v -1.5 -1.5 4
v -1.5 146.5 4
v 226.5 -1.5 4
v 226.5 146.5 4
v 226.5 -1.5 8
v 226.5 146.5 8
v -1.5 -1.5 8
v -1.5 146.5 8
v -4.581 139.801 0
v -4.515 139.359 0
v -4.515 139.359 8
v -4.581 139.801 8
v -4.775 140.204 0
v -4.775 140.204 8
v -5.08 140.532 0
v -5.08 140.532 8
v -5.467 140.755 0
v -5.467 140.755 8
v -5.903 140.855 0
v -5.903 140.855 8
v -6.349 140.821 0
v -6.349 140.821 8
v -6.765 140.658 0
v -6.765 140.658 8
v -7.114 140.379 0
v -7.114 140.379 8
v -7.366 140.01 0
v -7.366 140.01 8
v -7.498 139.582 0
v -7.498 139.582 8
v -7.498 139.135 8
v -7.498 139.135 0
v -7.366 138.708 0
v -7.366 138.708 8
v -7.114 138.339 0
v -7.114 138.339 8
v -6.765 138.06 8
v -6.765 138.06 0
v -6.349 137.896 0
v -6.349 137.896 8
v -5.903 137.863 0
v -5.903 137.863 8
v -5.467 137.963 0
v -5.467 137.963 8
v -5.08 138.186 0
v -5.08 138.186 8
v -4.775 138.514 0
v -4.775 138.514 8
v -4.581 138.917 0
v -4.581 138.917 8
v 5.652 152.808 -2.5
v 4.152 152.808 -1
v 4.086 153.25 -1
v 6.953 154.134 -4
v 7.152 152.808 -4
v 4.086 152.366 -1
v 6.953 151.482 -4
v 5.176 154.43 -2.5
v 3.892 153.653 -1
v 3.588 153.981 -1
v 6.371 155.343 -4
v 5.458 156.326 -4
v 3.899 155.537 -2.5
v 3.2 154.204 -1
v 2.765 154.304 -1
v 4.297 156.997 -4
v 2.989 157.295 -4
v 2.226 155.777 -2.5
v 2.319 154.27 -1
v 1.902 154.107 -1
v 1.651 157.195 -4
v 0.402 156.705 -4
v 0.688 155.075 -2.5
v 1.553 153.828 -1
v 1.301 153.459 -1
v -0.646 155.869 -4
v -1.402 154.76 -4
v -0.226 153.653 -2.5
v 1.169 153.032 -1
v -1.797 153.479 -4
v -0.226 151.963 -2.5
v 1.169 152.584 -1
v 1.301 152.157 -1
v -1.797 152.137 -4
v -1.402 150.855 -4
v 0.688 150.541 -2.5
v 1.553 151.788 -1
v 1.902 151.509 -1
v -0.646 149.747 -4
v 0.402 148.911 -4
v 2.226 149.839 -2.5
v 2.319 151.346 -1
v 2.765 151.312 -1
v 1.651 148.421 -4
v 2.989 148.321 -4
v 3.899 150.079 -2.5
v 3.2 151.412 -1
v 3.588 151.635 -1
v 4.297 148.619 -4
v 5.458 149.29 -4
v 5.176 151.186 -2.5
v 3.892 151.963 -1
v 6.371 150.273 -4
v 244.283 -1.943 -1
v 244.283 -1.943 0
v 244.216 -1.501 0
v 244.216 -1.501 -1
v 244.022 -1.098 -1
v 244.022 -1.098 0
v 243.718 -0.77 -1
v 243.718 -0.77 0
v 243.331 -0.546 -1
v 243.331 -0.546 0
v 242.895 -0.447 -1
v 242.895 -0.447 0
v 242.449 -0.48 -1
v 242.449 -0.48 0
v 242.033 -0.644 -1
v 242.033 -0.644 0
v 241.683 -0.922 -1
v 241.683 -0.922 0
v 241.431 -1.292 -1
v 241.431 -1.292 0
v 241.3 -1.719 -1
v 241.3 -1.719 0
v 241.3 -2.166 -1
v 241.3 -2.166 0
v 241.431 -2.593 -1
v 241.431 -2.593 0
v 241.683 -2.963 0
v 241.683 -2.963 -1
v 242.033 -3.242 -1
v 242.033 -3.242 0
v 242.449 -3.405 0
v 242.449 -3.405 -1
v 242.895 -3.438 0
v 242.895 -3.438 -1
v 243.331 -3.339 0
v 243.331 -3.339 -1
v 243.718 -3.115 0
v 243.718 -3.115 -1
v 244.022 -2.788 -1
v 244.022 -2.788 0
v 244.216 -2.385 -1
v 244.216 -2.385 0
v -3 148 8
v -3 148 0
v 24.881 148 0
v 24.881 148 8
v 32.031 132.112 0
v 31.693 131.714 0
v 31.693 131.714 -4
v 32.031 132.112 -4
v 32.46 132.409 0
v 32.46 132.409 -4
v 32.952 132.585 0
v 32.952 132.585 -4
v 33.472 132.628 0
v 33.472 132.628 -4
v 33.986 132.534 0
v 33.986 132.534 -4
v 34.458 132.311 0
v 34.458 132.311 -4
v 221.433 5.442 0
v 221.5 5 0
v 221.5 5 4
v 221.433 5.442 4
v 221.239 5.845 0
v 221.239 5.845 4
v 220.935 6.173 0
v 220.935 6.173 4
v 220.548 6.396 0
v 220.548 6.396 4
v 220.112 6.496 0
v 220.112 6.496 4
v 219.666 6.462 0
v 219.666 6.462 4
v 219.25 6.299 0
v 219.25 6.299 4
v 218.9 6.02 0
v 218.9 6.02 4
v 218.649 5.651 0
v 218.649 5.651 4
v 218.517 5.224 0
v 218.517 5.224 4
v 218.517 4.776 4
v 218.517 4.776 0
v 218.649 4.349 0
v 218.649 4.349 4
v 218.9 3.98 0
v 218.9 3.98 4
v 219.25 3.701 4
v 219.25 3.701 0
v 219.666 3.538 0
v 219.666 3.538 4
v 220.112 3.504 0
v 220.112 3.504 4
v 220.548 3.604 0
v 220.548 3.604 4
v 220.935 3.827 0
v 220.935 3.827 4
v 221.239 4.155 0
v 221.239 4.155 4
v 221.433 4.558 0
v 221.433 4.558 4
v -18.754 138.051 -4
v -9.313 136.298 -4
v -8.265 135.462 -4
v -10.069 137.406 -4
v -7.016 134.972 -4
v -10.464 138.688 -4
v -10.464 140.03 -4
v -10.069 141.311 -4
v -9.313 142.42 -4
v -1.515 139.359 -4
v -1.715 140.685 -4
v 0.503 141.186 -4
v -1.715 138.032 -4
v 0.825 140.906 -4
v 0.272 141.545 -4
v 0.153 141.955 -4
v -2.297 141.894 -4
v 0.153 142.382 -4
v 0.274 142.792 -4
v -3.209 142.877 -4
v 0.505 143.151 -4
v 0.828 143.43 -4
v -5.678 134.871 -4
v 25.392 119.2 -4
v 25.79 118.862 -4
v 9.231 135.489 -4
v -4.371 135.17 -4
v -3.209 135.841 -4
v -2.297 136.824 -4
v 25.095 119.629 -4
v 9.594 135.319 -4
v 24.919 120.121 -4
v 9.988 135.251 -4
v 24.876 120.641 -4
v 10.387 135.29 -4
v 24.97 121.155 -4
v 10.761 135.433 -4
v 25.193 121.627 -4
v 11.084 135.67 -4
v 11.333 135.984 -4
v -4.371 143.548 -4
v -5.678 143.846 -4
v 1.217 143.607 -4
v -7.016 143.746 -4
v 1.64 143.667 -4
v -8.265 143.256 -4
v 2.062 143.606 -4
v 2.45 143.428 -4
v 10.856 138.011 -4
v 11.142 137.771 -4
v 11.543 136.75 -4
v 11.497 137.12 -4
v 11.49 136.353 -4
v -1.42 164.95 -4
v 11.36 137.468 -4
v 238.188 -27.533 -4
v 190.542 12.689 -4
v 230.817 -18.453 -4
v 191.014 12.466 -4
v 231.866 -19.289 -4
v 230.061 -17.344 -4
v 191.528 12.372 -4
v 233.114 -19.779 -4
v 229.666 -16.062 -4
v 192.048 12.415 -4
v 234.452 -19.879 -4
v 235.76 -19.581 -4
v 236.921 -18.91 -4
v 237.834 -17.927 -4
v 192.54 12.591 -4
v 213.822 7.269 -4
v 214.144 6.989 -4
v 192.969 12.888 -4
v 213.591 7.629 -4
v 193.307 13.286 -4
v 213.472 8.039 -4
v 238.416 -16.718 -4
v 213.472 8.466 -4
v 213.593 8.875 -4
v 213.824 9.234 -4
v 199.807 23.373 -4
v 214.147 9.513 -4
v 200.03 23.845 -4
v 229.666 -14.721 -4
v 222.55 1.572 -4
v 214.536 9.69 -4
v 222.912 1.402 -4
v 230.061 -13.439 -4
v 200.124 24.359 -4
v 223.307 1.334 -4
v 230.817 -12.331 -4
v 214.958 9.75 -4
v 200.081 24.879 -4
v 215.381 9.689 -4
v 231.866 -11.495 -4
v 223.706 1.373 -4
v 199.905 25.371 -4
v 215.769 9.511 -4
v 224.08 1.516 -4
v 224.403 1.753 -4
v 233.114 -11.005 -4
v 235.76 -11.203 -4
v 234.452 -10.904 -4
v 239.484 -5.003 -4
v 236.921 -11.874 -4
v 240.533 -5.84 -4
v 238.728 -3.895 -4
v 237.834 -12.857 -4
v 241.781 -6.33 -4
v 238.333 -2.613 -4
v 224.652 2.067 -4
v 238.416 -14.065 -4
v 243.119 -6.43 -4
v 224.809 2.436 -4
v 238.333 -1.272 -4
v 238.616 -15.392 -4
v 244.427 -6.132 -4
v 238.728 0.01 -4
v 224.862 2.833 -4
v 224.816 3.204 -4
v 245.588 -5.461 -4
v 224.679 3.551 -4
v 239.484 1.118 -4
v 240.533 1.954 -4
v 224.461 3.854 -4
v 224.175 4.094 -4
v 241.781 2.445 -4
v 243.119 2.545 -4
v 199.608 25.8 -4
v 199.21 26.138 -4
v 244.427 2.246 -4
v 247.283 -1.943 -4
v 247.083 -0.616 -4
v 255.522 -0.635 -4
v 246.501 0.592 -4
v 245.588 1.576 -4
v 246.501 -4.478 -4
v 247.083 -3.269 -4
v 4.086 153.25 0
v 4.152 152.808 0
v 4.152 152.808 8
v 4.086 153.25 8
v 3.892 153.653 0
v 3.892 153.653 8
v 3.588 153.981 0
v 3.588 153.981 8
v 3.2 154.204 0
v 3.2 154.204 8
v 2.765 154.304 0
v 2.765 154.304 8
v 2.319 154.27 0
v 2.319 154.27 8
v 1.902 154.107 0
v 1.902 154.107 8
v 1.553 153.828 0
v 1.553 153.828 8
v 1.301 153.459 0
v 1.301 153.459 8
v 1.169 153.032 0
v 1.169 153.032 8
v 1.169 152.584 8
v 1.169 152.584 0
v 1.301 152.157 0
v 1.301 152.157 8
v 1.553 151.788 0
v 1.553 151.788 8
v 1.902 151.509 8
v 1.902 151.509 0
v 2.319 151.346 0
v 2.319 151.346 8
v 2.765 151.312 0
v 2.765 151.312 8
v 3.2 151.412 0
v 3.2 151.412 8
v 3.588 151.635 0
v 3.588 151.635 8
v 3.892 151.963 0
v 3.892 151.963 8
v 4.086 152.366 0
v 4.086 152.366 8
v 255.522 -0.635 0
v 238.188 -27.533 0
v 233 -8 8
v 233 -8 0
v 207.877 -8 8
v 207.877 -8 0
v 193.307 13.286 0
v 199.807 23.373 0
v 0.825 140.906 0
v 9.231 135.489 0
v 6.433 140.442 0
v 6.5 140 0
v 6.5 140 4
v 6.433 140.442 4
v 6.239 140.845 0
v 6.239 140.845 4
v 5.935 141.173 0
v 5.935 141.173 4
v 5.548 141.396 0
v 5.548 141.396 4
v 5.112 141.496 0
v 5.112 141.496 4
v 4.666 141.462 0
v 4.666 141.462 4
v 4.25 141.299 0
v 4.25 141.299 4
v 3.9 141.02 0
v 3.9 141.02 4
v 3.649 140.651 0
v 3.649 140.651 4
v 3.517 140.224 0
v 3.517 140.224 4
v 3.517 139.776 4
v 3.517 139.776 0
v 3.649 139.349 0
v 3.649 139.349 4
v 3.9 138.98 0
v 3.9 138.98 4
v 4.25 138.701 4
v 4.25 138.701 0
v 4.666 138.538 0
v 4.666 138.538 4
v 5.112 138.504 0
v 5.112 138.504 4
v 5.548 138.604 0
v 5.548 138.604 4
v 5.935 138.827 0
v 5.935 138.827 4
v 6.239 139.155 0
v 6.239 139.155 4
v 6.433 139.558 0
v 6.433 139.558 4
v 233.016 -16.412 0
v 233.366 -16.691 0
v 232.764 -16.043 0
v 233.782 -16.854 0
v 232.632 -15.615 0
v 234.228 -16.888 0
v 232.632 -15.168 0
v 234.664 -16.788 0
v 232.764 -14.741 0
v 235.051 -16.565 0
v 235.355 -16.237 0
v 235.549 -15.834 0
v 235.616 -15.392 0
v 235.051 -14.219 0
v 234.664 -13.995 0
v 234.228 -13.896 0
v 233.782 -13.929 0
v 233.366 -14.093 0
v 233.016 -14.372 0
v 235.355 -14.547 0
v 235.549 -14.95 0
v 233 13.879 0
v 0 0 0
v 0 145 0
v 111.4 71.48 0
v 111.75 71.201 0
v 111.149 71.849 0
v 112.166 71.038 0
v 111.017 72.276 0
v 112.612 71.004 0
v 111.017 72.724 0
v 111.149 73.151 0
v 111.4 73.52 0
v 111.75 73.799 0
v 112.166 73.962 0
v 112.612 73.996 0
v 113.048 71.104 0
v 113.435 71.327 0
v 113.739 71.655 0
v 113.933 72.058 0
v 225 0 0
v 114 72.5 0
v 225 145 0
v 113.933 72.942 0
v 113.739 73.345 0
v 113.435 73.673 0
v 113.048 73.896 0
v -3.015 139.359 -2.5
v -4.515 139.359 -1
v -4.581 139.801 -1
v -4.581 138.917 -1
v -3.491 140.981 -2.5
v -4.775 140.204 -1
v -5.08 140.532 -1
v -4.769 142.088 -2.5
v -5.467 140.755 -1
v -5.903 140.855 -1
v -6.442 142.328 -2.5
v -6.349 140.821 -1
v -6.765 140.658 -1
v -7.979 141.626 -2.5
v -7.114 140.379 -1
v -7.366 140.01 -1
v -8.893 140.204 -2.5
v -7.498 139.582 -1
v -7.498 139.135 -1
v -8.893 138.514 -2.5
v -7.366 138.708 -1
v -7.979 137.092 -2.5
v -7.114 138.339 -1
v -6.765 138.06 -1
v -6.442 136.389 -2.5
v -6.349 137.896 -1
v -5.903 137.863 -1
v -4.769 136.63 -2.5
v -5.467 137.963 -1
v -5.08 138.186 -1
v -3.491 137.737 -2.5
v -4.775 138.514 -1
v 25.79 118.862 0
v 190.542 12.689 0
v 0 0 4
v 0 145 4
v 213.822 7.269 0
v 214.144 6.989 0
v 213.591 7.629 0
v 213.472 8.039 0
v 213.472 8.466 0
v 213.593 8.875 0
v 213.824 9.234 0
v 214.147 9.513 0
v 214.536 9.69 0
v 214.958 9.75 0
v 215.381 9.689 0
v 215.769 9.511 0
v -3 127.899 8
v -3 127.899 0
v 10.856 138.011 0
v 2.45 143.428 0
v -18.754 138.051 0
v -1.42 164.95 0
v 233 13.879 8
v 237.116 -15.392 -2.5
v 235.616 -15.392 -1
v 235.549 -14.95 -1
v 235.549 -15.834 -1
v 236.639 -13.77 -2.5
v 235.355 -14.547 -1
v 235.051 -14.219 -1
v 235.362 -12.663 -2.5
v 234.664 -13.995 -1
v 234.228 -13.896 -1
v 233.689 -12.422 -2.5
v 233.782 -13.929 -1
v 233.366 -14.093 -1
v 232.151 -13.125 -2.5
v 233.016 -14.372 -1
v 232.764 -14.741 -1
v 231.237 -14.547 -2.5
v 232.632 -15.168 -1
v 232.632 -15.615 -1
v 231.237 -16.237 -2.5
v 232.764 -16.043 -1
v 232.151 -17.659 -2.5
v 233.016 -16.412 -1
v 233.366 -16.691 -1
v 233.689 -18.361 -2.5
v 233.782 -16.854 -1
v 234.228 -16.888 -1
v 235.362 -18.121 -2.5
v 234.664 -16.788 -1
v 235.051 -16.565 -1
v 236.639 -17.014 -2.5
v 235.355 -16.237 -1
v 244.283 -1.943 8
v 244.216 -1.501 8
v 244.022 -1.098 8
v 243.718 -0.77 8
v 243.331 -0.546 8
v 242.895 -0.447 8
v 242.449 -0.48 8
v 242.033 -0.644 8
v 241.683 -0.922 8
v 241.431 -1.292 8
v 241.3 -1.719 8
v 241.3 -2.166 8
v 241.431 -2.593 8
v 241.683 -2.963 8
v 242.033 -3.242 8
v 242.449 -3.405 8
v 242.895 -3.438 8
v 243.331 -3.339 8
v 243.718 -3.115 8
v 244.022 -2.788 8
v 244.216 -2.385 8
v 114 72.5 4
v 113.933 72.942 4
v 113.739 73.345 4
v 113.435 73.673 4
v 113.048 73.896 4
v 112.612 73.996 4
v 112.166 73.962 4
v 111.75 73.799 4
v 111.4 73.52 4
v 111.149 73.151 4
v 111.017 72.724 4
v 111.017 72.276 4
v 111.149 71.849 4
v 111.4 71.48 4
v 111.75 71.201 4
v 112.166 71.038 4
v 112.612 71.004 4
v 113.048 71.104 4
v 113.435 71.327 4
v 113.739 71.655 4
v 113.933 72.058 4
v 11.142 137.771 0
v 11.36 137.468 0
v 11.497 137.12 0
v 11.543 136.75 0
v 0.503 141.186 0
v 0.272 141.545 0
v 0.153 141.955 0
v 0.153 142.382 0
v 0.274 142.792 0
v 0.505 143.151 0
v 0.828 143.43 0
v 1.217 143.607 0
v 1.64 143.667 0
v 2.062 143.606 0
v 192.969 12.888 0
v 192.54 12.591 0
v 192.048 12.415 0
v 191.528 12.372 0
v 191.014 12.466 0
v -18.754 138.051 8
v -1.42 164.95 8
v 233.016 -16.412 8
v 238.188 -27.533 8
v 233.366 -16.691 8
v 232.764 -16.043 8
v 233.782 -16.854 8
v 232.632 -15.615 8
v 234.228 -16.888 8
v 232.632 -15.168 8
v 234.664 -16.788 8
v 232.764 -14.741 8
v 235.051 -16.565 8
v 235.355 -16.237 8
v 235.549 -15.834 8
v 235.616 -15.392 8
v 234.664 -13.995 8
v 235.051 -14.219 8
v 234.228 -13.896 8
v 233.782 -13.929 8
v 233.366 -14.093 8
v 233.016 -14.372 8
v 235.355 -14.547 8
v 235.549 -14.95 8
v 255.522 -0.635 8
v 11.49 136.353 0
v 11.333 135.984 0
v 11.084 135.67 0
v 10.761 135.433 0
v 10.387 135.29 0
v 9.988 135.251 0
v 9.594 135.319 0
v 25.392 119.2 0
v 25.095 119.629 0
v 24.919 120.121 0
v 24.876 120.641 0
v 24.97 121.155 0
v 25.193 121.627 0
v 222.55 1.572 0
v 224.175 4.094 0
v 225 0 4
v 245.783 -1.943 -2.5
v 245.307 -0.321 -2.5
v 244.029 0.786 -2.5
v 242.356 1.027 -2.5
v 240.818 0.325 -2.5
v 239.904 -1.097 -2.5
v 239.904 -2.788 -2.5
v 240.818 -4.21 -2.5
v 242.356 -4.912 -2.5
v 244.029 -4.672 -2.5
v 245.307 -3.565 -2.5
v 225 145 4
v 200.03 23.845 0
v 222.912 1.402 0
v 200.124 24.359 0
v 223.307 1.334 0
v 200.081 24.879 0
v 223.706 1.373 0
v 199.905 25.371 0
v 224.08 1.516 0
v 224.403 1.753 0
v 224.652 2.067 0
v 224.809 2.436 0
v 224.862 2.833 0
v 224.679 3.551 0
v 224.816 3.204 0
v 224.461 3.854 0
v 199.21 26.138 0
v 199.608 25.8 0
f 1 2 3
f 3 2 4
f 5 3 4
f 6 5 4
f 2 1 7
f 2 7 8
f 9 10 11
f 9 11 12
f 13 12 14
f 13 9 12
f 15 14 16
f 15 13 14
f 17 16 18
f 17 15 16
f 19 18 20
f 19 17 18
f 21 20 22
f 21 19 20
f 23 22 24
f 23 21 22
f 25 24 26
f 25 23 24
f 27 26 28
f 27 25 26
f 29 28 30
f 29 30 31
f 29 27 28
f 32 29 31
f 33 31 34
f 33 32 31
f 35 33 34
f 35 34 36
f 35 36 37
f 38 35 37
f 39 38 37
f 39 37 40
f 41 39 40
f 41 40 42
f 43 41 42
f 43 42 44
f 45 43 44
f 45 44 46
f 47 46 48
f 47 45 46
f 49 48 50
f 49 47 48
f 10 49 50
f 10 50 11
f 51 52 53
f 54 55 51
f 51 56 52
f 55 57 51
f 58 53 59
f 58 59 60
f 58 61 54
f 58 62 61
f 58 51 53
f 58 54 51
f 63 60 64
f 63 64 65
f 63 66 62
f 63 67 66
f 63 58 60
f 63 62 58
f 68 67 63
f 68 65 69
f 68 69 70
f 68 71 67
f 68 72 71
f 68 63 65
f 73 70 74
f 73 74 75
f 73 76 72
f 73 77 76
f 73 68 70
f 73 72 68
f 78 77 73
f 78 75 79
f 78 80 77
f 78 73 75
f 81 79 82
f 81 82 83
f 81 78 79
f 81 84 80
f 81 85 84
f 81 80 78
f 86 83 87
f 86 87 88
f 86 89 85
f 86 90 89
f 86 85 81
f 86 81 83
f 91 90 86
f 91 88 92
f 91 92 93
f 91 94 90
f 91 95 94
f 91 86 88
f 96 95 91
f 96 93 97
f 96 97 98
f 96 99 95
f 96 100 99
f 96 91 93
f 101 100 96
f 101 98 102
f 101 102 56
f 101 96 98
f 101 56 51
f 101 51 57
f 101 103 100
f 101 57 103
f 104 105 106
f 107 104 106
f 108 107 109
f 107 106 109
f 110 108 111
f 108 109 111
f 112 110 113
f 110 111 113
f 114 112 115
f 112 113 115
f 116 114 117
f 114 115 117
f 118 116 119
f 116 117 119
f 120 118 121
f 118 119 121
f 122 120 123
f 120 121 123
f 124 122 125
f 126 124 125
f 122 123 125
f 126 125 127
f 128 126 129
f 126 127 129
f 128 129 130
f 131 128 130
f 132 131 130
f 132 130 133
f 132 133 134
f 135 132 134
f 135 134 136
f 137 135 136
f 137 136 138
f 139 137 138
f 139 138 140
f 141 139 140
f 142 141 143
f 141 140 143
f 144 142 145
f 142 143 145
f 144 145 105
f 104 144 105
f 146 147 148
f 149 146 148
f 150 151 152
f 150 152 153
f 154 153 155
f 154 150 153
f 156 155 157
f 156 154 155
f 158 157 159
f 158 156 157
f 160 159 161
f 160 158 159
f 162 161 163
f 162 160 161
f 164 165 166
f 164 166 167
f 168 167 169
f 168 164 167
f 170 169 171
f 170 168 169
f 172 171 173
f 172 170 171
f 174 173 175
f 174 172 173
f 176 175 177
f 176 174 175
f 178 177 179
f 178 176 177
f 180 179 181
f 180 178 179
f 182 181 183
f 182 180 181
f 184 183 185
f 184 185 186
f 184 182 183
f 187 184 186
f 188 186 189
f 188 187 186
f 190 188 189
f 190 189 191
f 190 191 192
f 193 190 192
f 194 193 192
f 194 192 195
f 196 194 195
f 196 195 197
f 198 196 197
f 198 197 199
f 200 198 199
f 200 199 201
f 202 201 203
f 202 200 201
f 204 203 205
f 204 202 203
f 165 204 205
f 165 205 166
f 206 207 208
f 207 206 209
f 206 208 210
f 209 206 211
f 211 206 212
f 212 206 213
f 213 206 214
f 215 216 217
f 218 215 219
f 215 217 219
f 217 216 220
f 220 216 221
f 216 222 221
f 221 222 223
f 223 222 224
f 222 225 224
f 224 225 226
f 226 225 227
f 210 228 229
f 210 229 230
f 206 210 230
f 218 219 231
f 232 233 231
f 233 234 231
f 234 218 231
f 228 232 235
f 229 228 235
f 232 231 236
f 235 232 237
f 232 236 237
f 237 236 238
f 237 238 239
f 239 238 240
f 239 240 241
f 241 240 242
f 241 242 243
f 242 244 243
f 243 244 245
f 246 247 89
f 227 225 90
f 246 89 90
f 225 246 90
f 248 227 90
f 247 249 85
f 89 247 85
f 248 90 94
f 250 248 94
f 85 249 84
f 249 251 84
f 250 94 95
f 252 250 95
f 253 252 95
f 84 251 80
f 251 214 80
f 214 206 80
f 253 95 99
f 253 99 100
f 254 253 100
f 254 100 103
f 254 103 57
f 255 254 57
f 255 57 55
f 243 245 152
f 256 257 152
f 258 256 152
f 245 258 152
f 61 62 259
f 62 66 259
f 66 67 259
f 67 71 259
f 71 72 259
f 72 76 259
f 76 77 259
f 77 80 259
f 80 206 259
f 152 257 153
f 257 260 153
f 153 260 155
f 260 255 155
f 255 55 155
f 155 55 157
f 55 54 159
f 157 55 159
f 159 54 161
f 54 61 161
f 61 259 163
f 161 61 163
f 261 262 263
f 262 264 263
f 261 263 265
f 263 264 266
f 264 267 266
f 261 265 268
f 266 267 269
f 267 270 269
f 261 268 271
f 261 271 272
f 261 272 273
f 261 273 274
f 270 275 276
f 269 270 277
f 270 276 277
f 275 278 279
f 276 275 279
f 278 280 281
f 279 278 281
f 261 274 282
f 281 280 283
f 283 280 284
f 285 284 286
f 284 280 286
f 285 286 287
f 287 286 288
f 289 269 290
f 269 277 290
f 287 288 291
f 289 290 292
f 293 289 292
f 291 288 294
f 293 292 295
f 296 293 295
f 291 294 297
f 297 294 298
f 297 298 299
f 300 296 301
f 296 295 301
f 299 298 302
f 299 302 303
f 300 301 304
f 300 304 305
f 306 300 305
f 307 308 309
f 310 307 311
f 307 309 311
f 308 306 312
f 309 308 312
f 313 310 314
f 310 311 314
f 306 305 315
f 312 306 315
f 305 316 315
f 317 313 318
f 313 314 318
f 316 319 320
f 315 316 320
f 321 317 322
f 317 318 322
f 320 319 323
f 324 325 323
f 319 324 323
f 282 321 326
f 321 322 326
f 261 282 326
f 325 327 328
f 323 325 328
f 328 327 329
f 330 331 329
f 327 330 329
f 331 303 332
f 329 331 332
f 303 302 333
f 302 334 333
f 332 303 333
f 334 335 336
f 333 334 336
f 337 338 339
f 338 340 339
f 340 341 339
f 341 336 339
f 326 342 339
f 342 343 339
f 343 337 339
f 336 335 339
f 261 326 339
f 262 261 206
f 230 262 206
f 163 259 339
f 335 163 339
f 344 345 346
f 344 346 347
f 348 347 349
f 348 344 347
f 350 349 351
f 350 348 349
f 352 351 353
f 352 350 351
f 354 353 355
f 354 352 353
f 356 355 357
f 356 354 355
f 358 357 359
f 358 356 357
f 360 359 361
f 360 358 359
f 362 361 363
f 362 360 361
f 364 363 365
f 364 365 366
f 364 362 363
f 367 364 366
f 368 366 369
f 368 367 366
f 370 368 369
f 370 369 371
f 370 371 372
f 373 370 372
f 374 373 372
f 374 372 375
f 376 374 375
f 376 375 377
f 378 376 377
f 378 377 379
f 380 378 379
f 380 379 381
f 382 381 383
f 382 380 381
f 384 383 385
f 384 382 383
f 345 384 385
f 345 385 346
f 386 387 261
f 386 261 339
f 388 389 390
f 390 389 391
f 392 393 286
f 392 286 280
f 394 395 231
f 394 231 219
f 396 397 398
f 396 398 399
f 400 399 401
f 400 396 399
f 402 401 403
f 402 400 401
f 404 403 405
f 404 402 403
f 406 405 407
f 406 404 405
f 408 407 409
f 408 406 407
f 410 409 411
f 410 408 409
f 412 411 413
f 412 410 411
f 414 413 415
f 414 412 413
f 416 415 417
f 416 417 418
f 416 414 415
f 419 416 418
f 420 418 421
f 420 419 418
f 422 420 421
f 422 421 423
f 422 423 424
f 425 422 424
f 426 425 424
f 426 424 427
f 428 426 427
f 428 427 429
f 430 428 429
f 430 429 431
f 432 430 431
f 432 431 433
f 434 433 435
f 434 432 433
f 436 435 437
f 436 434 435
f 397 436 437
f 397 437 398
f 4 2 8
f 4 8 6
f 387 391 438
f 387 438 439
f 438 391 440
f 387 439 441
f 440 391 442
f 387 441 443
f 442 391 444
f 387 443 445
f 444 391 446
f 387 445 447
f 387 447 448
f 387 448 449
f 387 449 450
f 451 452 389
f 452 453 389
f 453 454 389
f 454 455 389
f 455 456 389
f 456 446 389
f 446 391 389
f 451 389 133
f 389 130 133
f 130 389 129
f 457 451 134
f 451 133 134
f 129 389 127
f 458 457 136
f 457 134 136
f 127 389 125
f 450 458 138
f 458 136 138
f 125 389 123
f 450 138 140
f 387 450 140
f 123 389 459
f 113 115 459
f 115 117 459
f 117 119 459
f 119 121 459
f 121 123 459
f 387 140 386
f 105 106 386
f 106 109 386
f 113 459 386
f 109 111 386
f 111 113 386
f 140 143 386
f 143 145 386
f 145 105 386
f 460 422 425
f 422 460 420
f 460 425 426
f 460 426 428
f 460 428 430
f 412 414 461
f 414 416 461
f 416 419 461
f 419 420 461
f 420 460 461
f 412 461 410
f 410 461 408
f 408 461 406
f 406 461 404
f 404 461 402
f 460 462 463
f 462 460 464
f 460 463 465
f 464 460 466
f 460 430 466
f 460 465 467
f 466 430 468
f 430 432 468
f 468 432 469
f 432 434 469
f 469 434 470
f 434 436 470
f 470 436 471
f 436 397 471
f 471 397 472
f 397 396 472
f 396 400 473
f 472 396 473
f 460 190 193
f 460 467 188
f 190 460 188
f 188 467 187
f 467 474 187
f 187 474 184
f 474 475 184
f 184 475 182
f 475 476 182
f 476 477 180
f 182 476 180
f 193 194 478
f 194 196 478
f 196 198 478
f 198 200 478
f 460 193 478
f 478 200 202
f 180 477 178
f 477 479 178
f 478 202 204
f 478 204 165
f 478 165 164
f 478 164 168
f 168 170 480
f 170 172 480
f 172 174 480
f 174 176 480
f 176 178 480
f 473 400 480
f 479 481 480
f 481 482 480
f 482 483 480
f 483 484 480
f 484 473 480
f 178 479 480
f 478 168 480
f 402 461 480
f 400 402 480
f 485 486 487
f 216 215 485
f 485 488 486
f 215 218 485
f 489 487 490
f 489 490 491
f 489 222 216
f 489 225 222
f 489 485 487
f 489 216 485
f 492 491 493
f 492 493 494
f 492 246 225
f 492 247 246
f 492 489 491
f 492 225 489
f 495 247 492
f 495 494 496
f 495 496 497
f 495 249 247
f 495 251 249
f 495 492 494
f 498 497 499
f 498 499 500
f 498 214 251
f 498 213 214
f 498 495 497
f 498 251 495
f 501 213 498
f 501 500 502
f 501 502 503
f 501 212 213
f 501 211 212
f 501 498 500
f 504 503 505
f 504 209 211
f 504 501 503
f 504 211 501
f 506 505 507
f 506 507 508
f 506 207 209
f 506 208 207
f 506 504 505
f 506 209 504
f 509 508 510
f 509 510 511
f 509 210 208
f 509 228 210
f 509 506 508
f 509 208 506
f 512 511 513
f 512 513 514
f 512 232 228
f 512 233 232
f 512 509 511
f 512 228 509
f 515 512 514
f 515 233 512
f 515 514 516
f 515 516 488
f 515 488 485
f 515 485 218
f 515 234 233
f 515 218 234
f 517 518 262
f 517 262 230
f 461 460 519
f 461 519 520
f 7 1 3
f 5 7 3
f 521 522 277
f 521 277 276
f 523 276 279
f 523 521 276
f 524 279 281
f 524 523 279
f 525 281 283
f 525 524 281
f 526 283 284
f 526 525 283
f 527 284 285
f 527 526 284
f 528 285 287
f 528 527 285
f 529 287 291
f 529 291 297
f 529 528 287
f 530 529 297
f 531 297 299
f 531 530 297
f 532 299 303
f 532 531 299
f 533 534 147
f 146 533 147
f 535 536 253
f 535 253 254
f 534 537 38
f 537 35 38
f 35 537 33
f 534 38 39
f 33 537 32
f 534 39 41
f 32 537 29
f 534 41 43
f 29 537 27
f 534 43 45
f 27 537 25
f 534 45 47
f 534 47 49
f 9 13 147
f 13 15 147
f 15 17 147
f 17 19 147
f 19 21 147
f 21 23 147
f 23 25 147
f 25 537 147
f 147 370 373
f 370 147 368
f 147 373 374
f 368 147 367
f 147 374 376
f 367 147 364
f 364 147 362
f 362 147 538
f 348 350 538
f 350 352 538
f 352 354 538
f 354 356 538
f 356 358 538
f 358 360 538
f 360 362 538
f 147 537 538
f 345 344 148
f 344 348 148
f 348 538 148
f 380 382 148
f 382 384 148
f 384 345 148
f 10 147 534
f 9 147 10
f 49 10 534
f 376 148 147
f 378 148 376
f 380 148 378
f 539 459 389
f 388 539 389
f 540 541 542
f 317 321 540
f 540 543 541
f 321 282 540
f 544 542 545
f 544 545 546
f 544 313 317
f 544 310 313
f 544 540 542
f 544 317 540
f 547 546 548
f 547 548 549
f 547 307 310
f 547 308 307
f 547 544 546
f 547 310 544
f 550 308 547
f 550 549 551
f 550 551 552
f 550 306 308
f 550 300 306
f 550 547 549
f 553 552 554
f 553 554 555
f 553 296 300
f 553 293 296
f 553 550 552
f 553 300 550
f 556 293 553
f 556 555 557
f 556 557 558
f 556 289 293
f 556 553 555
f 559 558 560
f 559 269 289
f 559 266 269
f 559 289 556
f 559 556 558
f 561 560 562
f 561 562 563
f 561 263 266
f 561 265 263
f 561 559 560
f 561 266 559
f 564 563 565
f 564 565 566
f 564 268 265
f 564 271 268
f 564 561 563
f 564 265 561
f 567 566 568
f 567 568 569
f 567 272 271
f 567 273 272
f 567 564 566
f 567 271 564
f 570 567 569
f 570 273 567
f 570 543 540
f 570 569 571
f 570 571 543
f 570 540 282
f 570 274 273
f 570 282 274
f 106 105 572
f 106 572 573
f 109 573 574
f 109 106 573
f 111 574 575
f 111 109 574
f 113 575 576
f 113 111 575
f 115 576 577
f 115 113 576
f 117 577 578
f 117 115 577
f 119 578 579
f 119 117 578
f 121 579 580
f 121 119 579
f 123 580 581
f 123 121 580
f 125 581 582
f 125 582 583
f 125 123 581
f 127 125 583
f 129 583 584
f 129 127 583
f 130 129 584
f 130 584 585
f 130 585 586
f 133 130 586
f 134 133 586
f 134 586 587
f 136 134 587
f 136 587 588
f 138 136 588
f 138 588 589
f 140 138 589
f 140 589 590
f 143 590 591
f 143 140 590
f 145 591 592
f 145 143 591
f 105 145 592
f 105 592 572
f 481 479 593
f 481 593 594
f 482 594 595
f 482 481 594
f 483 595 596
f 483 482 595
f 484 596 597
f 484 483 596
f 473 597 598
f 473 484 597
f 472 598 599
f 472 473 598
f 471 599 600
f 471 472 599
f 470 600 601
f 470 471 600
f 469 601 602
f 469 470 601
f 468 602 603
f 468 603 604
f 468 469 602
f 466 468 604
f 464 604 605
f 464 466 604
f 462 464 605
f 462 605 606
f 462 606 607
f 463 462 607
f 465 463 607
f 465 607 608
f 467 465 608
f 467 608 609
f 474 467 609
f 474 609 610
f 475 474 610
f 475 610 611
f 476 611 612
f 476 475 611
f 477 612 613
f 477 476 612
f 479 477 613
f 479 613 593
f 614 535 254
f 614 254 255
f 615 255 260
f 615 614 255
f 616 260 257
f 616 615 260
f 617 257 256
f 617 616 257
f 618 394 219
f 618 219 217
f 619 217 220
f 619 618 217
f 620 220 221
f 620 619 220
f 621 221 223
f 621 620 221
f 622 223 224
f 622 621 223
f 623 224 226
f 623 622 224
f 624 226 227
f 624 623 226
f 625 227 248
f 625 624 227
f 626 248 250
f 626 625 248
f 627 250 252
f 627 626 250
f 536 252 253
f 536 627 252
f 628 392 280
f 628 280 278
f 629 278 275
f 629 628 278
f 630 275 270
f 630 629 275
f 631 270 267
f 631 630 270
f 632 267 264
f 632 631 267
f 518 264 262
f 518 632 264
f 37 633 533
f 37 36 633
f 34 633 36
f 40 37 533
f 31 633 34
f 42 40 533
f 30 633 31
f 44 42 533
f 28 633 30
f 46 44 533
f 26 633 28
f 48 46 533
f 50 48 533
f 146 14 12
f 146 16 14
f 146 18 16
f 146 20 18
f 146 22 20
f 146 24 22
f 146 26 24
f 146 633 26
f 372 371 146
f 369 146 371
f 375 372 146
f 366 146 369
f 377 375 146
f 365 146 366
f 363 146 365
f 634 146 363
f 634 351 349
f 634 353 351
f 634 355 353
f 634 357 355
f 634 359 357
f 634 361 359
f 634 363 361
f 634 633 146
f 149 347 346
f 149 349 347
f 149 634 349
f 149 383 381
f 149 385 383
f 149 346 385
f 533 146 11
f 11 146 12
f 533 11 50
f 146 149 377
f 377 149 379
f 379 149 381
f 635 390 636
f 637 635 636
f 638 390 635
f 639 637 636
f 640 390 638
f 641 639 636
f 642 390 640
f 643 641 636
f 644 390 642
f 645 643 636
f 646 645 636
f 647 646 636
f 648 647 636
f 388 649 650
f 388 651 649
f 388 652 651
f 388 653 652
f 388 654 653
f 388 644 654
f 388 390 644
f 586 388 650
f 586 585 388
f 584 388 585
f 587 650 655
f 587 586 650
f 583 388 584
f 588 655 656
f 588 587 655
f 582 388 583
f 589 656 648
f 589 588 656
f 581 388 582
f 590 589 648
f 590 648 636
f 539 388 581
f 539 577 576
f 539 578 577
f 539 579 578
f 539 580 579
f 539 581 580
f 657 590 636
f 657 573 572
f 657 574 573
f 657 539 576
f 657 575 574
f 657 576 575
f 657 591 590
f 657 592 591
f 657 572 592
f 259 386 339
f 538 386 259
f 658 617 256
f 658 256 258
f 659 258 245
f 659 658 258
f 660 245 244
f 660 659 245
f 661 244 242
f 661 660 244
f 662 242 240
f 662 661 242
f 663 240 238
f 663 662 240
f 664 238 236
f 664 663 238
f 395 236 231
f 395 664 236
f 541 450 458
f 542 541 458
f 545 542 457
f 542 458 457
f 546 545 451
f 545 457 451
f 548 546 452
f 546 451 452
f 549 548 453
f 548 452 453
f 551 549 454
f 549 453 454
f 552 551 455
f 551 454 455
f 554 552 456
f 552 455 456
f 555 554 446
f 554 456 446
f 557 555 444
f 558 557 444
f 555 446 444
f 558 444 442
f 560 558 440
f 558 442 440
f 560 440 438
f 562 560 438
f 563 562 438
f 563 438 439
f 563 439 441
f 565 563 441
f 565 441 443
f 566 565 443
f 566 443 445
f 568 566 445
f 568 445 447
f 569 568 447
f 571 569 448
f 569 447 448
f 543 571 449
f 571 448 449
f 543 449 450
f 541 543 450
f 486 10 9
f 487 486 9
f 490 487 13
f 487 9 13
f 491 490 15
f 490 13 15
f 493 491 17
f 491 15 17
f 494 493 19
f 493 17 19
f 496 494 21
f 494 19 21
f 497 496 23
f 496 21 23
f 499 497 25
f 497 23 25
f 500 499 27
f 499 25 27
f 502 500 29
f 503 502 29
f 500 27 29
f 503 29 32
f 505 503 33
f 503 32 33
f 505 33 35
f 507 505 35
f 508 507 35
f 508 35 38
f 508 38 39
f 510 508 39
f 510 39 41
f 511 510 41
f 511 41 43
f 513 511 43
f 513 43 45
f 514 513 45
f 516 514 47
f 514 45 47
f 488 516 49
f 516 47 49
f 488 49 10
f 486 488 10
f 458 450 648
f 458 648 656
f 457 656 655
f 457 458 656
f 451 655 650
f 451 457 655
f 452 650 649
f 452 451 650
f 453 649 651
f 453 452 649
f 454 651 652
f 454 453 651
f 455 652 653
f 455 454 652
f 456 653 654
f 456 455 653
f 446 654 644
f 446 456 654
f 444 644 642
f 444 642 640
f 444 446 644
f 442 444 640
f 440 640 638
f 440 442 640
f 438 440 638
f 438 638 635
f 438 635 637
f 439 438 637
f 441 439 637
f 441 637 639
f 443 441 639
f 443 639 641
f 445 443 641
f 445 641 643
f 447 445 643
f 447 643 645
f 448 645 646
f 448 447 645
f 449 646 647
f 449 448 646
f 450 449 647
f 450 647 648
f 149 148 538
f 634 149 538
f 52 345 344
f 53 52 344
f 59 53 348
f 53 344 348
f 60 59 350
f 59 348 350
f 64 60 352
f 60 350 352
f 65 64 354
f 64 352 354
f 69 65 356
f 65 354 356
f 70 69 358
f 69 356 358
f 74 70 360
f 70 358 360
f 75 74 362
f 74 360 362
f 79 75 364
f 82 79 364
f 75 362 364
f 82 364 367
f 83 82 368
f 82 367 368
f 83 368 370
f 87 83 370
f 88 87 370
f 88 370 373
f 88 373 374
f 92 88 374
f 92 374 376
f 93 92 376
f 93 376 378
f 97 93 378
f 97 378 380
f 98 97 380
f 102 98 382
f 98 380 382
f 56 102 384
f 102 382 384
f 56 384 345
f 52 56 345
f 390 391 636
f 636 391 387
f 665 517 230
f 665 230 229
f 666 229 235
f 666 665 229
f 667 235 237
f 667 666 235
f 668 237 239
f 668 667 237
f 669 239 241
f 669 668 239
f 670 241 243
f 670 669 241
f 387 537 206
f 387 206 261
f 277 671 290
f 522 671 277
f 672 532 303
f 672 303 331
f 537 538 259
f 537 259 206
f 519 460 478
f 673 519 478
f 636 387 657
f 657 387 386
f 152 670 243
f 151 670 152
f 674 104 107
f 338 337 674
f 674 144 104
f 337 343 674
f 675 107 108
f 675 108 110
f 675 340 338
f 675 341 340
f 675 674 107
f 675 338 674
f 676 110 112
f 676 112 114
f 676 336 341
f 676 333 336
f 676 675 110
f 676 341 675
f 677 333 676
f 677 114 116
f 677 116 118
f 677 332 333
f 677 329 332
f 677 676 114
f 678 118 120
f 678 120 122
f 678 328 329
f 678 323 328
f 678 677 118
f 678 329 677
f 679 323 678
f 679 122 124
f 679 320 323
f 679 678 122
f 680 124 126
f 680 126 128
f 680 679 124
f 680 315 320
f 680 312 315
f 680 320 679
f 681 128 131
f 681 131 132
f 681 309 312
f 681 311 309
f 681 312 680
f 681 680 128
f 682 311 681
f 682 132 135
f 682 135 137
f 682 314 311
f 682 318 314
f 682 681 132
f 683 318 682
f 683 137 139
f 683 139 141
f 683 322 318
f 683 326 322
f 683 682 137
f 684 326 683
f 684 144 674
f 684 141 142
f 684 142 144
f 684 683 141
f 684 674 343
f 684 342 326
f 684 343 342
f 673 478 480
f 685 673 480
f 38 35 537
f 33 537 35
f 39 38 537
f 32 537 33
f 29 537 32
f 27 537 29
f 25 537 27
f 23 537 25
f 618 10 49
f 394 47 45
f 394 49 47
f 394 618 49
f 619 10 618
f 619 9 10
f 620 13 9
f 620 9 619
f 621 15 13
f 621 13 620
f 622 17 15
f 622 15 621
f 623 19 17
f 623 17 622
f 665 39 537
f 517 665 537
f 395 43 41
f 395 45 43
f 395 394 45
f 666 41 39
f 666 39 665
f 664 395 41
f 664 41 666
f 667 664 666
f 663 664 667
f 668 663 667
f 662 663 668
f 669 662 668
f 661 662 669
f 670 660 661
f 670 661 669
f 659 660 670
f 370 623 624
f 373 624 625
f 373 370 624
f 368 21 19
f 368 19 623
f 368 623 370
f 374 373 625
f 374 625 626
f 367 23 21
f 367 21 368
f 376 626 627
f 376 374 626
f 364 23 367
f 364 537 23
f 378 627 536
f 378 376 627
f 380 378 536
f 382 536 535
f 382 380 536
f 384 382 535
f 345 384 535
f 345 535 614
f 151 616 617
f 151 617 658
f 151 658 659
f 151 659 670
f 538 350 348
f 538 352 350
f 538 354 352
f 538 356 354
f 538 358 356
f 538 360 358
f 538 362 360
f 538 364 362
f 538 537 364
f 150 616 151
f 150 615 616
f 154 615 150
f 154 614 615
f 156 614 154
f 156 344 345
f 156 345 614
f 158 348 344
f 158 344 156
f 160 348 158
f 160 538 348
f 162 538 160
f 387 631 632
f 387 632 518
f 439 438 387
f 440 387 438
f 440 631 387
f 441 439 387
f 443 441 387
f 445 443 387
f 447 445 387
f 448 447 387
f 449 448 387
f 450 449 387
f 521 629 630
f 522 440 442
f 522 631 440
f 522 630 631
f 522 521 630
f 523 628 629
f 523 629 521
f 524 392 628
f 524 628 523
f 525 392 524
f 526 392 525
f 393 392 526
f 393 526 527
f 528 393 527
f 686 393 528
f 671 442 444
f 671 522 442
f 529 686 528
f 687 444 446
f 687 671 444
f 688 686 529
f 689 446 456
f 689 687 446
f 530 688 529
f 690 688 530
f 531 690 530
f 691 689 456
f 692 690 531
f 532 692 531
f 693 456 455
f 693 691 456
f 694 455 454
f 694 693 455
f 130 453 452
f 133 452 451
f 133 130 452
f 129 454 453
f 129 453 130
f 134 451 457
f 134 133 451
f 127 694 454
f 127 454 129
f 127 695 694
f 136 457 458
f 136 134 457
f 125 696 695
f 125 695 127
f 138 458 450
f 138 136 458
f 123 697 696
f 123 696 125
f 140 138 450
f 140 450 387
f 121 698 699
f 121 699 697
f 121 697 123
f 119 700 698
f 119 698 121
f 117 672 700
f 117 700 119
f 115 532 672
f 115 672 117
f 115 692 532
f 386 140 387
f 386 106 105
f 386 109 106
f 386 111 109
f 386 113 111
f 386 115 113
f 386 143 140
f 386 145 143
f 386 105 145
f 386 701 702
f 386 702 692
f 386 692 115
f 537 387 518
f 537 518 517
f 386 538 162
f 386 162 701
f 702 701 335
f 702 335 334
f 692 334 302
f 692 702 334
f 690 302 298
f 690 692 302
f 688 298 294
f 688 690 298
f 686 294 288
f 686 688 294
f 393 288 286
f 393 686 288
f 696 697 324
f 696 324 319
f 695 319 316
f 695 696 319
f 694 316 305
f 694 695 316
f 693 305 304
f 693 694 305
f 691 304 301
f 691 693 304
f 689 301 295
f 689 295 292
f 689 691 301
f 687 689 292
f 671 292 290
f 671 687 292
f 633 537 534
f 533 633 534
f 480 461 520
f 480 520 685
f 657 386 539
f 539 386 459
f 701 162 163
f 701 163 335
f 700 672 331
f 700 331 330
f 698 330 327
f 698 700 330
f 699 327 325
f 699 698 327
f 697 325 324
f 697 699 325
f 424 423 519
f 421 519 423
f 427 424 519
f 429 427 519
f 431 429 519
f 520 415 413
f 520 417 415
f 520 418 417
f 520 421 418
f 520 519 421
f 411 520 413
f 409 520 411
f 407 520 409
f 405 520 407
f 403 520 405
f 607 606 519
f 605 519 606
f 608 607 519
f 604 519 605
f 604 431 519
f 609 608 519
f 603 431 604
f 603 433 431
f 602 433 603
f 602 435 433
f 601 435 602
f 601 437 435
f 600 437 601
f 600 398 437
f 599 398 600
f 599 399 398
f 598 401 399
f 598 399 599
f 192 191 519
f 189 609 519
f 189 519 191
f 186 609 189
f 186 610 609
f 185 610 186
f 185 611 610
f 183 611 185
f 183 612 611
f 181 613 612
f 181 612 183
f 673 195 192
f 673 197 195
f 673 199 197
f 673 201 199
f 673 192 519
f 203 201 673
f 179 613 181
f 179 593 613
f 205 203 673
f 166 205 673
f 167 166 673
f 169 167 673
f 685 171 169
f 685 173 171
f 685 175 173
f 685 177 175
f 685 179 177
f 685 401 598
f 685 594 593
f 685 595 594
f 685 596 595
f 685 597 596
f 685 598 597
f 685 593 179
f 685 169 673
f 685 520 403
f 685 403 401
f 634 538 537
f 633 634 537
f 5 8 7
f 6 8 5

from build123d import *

# Parameters (mm, degrees)
F1_W     = 225
F1_H     = 145
F1_R     = 1.5
F2_DEPTH = 4
F3_R     = 1.5
F4_DEPTH = 4
F5_R     = 1.5
F6_DEPTH = 8
F7_DEPTH = 8
F8_START = 4
F1_W_2   = 228
F1_H_2   = 148
F8_DEPTH = 4
F9_SIZE  = 3


with BuildPart() as f2:
    # F1 (on Top) → F2 (new body)
    with BuildSketch(Plane.XY):
        with Locations((112.5, 72.5)):
            Rectangle(F1_W, F1_H)
        with Locations((220, 5)):
            Circle(F1_R, mode=Mode.SUBTRACT)
        with Locations((5, 140)):
            Circle(F1_R, mode=Mode.SUBTRACT)
        with Locations((112.5, 72.5)):
            Circle(F1_R, mode=Mode.SUBTRACT)
    extrude(amount=F2_DEPTH)


with BuildPart() as f4:
    # F3 (on Top) → F4 (new body)
    with BuildSketch(Plane.XY):
        Polygon((-1.4196310815, 164.9495525662), (-18.7540737608, 138.0512794432), (238.1876255728, -27.5333712384), (255.5220682521, -0.6350981154), align=None)
        with Locations((234.1155258917, -15.3917896204)):
            Circle(F3_R, mode=Mode.SUBTRACT)
        with BuildLine():
            ThreePointArc((214.1440217888, 6.9893514497), (213.6957172368, 9.062760003), (215.76912579, 9.511064555))
            Line((215.76912579, 9.511064555), (224.174836141, 4.0940512177))
            ThreePointArc((224.174836141, 4.0940512177), (224.6792556664, 3.551237839), (224.8622841404, 2.8331946651))
            ThreePointArc((224.8622841404, 2.8331946651), (224.0803273143, 1.516223139), (222.5497321398, 1.5723381125))
            Line((222.5497321398, 1.5723381125), (214.1440217888, 6.9893514497))
        make_face(mode=Mode.SUBTRACT)
        with Locations((242.7827472313, -1.9426530589)):
            Circle(F3_R, mode=Mode.SUBTRACT)
        with BuildLine():
            ThreePointArc((31.693104493, 131.7135595833), (32.9515809781, 132.5849852467), (34.4576492306, 132.311298986))
            Line((34.4576492306, 132.311298986), (199.209572109, 26.1378375755))
            ThreePointArc((199.209572109, 26.1378375755), (200.0809977724, 24.8793610904), (199.8073115117, 23.3732928379))
            Line((199.8073115117, 23.3732928379), (193.306895507, 13.2864404167))
            ThreePointArc((193.306895507, 13.2864404167), (192.0484190219, 12.4150147533), (190.5423507694, 12.688701014))
            Line((190.5423507694, 12.688701014), (25.790427891, 118.8621624245))
            ThreePointArc((25.790427891, 118.8621624245), (24.9190022276, 120.1206389096), (25.1926884883, 121.6267071621))
            Line((25.1926884883, 121.6267071621), (31.693104493, 131.7135595833))
        make_face(mode=Mode.SUBTRACT)
        with Locations((-6.01475274, 139.3588343867)):
            Circle(F3_R, mode=Mode.SUBTRACT)
        with BuildLine():
            ThreePointArc((0.825163859, 140.9059487823), (0.376859307, 142.9793573355), (2.4502678602, 143.4276618875))
            Line((2.4502678602, 143.4276618875), (10.8559782112, 138.0106485503))
            ThreePointArc((10.8559782112, 138.0106485503), (11.3603977366, 137.4678351715), (11.5434262106, 136.7497919976))
            ThreePointArc((11.5434262106, 136.7497919976), (10.7614693844, 135.4328204716), (9.23087421, 135.488935445))
            Line((9.23087421, 135.488935445), (0.825163859, 140.9059487823))
        make_face(mode=Mode.SUBTRACT)
        with Locations((2.6524685996, 152.8079709482)):
            Circle(F3_R, mode=Mode.SUBTRACT)
    extrude(amount=-F4_DEPTH)

    # F9
    f9_edges = [f4.edges().sort_by_distance(p)[0] for p in [
        (232.615526, -15.39179, -4),
        (241.282747, -1.942653, -4),
        (1.152469, 152.807971, -4),
        (-7.514753, 139.358834, -4),
    ]]
    chamfer(f9_edges, length=F9_SIZE)


with BuildPart() as f6:
    # F5 (on face) → F6 (new body)
    with BuildSketch(Plane.XY):
        Polygon((24.8813987626, 148), (-1.4196310815, 164.9495525662), (-18.7540737608, 138.0512794432), (-3, 127.8986541307), (-3, 148), align=None)
        with Locations((-6.01475274, 139.3588343867)):
            Circle(F5_R, mode=Mode.SUBTRACT)
        with Locations((2.6524685996, 152.8079709482)):
            Circle(F5_R, mode=Mode.SUBTRACT)
    extrude(amount=F6_DEPTH)


with BuildPart() as f7:
    # F5 (on face) → F7 (new body)
    with BuildSketch(Plane.XY):
        Polygon((255.5220682521, -0.6350981154), (233, 13.879123647), (233, -8), (207.877221927, -8), (238.1876255728, -27.5333712384), align=None)
        with Locations((234.1155258917, -15.3917896204)):
            Circle(F5_R, mode=Mode.SUBTRACT)
        with Locations((242.7827472313, -1.9426530589)):
            Circle(F5_R, mode=Mode.SUBTRACT)
    extrude(amount=F7_DEPTH)


with BuildPart() as f8:
    # F1 (on Top) → F8 (new body)
    with BuildSketch(Plane.XY.offset(F8_START)):
        with Locations((112.5, 72.5)):
            Rectangle(F1_W_2, F1_H_2)
        with Locations((112.5, 72.5)):
            Rectangle(F1_W, F1_H, mode=Mode.SUBTRACT)
        with Locations((112.5, 72.5)):
            Rectangle(F1_W, F1_H)
        with Locations((220, 5)):
            Circle(F1_R, mode=Mode.SUBTRACT)
        with Locations((5, 140)):
            Circle(F1_R, mode=Mode.SUBTRACT)
        with Locations((112.5, 72.5)):
            Circle(F1_R, mode=Mode.SUBTRACT)
        with Locations((5, 140)):
            Circle(F1_R)
        with Locations((220, 5)):
            Circle(F1_R)
        with Locations((112.5, 72.5)):
            Circle(F1_R)
    extrude(amount=F8_DEPTH)


solid = Compound([f2.part, f4.part, f6.part, f7.part, f8.part])
